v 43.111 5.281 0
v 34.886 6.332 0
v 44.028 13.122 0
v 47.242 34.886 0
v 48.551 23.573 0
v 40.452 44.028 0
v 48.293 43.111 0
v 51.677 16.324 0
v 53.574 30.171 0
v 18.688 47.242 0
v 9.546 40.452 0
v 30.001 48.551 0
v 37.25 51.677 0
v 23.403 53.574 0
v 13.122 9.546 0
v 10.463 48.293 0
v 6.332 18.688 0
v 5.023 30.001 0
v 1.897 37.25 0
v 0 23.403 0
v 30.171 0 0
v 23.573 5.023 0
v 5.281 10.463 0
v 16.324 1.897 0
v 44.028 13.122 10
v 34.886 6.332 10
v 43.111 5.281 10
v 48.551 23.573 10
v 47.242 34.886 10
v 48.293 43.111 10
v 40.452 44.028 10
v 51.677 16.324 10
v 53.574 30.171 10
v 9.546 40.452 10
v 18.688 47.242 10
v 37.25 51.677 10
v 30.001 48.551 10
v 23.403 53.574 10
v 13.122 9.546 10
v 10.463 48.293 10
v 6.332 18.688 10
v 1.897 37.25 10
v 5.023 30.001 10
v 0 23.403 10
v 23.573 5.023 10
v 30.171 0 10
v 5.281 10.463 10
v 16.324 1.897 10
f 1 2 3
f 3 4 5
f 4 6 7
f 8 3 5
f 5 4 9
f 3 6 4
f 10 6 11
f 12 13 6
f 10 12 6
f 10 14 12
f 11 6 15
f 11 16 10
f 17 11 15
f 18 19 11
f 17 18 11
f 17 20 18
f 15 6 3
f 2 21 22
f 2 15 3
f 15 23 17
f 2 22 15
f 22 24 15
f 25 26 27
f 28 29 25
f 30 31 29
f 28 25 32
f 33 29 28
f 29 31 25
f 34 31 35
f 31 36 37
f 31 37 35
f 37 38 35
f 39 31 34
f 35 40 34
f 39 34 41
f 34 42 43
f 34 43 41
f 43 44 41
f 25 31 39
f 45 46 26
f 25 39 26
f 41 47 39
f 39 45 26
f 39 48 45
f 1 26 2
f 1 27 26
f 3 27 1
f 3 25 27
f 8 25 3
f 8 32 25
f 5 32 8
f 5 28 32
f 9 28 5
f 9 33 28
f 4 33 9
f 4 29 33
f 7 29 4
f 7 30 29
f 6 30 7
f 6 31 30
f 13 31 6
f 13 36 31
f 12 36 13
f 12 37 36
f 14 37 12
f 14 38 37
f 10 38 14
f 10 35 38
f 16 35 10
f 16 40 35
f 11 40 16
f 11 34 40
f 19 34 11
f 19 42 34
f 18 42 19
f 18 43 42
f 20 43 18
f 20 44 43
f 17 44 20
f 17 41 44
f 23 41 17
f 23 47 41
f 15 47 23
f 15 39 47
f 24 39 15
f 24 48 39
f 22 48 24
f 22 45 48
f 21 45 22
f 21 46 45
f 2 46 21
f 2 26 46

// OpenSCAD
$fn = 32;

// ----------------------------------------------------------------------
// Chain sprocket: 12 teeth, 22 mm root radius
// ----------------------------------------------------------------------

// --- parameters (mm) ---
profile_height = 10;      // extrusion height
profile_points = 24;      // points of the closed outline

profile = [[48.551, 23.573], [53.574, 30.171], [47.242, 34.886], [48.293, 43.111], [40.452, 44.028], [37.25, 51.677], [30.001, 48.551], [23.403, 53.574], [18.688, 47.242], [10.463, 48.293], [9.546, 40.452], [1.897, 37.25], [5.023, 30.001], [0, 23.403], [6.332, 18.688], [5.281, 10.463], [13.122, 9.546], [16.324, 1.897], [23.573, 5.023], [30.171, 0], [34.886, 6.332], [43.111, 5.281], [44.028, 13.122], [51.677, 16.324]];  // single closed polygon, 24 points, counter clockwise

// --- the one profile operation ---
linear_extrude(height = profile_height) polygon(points = profile);
